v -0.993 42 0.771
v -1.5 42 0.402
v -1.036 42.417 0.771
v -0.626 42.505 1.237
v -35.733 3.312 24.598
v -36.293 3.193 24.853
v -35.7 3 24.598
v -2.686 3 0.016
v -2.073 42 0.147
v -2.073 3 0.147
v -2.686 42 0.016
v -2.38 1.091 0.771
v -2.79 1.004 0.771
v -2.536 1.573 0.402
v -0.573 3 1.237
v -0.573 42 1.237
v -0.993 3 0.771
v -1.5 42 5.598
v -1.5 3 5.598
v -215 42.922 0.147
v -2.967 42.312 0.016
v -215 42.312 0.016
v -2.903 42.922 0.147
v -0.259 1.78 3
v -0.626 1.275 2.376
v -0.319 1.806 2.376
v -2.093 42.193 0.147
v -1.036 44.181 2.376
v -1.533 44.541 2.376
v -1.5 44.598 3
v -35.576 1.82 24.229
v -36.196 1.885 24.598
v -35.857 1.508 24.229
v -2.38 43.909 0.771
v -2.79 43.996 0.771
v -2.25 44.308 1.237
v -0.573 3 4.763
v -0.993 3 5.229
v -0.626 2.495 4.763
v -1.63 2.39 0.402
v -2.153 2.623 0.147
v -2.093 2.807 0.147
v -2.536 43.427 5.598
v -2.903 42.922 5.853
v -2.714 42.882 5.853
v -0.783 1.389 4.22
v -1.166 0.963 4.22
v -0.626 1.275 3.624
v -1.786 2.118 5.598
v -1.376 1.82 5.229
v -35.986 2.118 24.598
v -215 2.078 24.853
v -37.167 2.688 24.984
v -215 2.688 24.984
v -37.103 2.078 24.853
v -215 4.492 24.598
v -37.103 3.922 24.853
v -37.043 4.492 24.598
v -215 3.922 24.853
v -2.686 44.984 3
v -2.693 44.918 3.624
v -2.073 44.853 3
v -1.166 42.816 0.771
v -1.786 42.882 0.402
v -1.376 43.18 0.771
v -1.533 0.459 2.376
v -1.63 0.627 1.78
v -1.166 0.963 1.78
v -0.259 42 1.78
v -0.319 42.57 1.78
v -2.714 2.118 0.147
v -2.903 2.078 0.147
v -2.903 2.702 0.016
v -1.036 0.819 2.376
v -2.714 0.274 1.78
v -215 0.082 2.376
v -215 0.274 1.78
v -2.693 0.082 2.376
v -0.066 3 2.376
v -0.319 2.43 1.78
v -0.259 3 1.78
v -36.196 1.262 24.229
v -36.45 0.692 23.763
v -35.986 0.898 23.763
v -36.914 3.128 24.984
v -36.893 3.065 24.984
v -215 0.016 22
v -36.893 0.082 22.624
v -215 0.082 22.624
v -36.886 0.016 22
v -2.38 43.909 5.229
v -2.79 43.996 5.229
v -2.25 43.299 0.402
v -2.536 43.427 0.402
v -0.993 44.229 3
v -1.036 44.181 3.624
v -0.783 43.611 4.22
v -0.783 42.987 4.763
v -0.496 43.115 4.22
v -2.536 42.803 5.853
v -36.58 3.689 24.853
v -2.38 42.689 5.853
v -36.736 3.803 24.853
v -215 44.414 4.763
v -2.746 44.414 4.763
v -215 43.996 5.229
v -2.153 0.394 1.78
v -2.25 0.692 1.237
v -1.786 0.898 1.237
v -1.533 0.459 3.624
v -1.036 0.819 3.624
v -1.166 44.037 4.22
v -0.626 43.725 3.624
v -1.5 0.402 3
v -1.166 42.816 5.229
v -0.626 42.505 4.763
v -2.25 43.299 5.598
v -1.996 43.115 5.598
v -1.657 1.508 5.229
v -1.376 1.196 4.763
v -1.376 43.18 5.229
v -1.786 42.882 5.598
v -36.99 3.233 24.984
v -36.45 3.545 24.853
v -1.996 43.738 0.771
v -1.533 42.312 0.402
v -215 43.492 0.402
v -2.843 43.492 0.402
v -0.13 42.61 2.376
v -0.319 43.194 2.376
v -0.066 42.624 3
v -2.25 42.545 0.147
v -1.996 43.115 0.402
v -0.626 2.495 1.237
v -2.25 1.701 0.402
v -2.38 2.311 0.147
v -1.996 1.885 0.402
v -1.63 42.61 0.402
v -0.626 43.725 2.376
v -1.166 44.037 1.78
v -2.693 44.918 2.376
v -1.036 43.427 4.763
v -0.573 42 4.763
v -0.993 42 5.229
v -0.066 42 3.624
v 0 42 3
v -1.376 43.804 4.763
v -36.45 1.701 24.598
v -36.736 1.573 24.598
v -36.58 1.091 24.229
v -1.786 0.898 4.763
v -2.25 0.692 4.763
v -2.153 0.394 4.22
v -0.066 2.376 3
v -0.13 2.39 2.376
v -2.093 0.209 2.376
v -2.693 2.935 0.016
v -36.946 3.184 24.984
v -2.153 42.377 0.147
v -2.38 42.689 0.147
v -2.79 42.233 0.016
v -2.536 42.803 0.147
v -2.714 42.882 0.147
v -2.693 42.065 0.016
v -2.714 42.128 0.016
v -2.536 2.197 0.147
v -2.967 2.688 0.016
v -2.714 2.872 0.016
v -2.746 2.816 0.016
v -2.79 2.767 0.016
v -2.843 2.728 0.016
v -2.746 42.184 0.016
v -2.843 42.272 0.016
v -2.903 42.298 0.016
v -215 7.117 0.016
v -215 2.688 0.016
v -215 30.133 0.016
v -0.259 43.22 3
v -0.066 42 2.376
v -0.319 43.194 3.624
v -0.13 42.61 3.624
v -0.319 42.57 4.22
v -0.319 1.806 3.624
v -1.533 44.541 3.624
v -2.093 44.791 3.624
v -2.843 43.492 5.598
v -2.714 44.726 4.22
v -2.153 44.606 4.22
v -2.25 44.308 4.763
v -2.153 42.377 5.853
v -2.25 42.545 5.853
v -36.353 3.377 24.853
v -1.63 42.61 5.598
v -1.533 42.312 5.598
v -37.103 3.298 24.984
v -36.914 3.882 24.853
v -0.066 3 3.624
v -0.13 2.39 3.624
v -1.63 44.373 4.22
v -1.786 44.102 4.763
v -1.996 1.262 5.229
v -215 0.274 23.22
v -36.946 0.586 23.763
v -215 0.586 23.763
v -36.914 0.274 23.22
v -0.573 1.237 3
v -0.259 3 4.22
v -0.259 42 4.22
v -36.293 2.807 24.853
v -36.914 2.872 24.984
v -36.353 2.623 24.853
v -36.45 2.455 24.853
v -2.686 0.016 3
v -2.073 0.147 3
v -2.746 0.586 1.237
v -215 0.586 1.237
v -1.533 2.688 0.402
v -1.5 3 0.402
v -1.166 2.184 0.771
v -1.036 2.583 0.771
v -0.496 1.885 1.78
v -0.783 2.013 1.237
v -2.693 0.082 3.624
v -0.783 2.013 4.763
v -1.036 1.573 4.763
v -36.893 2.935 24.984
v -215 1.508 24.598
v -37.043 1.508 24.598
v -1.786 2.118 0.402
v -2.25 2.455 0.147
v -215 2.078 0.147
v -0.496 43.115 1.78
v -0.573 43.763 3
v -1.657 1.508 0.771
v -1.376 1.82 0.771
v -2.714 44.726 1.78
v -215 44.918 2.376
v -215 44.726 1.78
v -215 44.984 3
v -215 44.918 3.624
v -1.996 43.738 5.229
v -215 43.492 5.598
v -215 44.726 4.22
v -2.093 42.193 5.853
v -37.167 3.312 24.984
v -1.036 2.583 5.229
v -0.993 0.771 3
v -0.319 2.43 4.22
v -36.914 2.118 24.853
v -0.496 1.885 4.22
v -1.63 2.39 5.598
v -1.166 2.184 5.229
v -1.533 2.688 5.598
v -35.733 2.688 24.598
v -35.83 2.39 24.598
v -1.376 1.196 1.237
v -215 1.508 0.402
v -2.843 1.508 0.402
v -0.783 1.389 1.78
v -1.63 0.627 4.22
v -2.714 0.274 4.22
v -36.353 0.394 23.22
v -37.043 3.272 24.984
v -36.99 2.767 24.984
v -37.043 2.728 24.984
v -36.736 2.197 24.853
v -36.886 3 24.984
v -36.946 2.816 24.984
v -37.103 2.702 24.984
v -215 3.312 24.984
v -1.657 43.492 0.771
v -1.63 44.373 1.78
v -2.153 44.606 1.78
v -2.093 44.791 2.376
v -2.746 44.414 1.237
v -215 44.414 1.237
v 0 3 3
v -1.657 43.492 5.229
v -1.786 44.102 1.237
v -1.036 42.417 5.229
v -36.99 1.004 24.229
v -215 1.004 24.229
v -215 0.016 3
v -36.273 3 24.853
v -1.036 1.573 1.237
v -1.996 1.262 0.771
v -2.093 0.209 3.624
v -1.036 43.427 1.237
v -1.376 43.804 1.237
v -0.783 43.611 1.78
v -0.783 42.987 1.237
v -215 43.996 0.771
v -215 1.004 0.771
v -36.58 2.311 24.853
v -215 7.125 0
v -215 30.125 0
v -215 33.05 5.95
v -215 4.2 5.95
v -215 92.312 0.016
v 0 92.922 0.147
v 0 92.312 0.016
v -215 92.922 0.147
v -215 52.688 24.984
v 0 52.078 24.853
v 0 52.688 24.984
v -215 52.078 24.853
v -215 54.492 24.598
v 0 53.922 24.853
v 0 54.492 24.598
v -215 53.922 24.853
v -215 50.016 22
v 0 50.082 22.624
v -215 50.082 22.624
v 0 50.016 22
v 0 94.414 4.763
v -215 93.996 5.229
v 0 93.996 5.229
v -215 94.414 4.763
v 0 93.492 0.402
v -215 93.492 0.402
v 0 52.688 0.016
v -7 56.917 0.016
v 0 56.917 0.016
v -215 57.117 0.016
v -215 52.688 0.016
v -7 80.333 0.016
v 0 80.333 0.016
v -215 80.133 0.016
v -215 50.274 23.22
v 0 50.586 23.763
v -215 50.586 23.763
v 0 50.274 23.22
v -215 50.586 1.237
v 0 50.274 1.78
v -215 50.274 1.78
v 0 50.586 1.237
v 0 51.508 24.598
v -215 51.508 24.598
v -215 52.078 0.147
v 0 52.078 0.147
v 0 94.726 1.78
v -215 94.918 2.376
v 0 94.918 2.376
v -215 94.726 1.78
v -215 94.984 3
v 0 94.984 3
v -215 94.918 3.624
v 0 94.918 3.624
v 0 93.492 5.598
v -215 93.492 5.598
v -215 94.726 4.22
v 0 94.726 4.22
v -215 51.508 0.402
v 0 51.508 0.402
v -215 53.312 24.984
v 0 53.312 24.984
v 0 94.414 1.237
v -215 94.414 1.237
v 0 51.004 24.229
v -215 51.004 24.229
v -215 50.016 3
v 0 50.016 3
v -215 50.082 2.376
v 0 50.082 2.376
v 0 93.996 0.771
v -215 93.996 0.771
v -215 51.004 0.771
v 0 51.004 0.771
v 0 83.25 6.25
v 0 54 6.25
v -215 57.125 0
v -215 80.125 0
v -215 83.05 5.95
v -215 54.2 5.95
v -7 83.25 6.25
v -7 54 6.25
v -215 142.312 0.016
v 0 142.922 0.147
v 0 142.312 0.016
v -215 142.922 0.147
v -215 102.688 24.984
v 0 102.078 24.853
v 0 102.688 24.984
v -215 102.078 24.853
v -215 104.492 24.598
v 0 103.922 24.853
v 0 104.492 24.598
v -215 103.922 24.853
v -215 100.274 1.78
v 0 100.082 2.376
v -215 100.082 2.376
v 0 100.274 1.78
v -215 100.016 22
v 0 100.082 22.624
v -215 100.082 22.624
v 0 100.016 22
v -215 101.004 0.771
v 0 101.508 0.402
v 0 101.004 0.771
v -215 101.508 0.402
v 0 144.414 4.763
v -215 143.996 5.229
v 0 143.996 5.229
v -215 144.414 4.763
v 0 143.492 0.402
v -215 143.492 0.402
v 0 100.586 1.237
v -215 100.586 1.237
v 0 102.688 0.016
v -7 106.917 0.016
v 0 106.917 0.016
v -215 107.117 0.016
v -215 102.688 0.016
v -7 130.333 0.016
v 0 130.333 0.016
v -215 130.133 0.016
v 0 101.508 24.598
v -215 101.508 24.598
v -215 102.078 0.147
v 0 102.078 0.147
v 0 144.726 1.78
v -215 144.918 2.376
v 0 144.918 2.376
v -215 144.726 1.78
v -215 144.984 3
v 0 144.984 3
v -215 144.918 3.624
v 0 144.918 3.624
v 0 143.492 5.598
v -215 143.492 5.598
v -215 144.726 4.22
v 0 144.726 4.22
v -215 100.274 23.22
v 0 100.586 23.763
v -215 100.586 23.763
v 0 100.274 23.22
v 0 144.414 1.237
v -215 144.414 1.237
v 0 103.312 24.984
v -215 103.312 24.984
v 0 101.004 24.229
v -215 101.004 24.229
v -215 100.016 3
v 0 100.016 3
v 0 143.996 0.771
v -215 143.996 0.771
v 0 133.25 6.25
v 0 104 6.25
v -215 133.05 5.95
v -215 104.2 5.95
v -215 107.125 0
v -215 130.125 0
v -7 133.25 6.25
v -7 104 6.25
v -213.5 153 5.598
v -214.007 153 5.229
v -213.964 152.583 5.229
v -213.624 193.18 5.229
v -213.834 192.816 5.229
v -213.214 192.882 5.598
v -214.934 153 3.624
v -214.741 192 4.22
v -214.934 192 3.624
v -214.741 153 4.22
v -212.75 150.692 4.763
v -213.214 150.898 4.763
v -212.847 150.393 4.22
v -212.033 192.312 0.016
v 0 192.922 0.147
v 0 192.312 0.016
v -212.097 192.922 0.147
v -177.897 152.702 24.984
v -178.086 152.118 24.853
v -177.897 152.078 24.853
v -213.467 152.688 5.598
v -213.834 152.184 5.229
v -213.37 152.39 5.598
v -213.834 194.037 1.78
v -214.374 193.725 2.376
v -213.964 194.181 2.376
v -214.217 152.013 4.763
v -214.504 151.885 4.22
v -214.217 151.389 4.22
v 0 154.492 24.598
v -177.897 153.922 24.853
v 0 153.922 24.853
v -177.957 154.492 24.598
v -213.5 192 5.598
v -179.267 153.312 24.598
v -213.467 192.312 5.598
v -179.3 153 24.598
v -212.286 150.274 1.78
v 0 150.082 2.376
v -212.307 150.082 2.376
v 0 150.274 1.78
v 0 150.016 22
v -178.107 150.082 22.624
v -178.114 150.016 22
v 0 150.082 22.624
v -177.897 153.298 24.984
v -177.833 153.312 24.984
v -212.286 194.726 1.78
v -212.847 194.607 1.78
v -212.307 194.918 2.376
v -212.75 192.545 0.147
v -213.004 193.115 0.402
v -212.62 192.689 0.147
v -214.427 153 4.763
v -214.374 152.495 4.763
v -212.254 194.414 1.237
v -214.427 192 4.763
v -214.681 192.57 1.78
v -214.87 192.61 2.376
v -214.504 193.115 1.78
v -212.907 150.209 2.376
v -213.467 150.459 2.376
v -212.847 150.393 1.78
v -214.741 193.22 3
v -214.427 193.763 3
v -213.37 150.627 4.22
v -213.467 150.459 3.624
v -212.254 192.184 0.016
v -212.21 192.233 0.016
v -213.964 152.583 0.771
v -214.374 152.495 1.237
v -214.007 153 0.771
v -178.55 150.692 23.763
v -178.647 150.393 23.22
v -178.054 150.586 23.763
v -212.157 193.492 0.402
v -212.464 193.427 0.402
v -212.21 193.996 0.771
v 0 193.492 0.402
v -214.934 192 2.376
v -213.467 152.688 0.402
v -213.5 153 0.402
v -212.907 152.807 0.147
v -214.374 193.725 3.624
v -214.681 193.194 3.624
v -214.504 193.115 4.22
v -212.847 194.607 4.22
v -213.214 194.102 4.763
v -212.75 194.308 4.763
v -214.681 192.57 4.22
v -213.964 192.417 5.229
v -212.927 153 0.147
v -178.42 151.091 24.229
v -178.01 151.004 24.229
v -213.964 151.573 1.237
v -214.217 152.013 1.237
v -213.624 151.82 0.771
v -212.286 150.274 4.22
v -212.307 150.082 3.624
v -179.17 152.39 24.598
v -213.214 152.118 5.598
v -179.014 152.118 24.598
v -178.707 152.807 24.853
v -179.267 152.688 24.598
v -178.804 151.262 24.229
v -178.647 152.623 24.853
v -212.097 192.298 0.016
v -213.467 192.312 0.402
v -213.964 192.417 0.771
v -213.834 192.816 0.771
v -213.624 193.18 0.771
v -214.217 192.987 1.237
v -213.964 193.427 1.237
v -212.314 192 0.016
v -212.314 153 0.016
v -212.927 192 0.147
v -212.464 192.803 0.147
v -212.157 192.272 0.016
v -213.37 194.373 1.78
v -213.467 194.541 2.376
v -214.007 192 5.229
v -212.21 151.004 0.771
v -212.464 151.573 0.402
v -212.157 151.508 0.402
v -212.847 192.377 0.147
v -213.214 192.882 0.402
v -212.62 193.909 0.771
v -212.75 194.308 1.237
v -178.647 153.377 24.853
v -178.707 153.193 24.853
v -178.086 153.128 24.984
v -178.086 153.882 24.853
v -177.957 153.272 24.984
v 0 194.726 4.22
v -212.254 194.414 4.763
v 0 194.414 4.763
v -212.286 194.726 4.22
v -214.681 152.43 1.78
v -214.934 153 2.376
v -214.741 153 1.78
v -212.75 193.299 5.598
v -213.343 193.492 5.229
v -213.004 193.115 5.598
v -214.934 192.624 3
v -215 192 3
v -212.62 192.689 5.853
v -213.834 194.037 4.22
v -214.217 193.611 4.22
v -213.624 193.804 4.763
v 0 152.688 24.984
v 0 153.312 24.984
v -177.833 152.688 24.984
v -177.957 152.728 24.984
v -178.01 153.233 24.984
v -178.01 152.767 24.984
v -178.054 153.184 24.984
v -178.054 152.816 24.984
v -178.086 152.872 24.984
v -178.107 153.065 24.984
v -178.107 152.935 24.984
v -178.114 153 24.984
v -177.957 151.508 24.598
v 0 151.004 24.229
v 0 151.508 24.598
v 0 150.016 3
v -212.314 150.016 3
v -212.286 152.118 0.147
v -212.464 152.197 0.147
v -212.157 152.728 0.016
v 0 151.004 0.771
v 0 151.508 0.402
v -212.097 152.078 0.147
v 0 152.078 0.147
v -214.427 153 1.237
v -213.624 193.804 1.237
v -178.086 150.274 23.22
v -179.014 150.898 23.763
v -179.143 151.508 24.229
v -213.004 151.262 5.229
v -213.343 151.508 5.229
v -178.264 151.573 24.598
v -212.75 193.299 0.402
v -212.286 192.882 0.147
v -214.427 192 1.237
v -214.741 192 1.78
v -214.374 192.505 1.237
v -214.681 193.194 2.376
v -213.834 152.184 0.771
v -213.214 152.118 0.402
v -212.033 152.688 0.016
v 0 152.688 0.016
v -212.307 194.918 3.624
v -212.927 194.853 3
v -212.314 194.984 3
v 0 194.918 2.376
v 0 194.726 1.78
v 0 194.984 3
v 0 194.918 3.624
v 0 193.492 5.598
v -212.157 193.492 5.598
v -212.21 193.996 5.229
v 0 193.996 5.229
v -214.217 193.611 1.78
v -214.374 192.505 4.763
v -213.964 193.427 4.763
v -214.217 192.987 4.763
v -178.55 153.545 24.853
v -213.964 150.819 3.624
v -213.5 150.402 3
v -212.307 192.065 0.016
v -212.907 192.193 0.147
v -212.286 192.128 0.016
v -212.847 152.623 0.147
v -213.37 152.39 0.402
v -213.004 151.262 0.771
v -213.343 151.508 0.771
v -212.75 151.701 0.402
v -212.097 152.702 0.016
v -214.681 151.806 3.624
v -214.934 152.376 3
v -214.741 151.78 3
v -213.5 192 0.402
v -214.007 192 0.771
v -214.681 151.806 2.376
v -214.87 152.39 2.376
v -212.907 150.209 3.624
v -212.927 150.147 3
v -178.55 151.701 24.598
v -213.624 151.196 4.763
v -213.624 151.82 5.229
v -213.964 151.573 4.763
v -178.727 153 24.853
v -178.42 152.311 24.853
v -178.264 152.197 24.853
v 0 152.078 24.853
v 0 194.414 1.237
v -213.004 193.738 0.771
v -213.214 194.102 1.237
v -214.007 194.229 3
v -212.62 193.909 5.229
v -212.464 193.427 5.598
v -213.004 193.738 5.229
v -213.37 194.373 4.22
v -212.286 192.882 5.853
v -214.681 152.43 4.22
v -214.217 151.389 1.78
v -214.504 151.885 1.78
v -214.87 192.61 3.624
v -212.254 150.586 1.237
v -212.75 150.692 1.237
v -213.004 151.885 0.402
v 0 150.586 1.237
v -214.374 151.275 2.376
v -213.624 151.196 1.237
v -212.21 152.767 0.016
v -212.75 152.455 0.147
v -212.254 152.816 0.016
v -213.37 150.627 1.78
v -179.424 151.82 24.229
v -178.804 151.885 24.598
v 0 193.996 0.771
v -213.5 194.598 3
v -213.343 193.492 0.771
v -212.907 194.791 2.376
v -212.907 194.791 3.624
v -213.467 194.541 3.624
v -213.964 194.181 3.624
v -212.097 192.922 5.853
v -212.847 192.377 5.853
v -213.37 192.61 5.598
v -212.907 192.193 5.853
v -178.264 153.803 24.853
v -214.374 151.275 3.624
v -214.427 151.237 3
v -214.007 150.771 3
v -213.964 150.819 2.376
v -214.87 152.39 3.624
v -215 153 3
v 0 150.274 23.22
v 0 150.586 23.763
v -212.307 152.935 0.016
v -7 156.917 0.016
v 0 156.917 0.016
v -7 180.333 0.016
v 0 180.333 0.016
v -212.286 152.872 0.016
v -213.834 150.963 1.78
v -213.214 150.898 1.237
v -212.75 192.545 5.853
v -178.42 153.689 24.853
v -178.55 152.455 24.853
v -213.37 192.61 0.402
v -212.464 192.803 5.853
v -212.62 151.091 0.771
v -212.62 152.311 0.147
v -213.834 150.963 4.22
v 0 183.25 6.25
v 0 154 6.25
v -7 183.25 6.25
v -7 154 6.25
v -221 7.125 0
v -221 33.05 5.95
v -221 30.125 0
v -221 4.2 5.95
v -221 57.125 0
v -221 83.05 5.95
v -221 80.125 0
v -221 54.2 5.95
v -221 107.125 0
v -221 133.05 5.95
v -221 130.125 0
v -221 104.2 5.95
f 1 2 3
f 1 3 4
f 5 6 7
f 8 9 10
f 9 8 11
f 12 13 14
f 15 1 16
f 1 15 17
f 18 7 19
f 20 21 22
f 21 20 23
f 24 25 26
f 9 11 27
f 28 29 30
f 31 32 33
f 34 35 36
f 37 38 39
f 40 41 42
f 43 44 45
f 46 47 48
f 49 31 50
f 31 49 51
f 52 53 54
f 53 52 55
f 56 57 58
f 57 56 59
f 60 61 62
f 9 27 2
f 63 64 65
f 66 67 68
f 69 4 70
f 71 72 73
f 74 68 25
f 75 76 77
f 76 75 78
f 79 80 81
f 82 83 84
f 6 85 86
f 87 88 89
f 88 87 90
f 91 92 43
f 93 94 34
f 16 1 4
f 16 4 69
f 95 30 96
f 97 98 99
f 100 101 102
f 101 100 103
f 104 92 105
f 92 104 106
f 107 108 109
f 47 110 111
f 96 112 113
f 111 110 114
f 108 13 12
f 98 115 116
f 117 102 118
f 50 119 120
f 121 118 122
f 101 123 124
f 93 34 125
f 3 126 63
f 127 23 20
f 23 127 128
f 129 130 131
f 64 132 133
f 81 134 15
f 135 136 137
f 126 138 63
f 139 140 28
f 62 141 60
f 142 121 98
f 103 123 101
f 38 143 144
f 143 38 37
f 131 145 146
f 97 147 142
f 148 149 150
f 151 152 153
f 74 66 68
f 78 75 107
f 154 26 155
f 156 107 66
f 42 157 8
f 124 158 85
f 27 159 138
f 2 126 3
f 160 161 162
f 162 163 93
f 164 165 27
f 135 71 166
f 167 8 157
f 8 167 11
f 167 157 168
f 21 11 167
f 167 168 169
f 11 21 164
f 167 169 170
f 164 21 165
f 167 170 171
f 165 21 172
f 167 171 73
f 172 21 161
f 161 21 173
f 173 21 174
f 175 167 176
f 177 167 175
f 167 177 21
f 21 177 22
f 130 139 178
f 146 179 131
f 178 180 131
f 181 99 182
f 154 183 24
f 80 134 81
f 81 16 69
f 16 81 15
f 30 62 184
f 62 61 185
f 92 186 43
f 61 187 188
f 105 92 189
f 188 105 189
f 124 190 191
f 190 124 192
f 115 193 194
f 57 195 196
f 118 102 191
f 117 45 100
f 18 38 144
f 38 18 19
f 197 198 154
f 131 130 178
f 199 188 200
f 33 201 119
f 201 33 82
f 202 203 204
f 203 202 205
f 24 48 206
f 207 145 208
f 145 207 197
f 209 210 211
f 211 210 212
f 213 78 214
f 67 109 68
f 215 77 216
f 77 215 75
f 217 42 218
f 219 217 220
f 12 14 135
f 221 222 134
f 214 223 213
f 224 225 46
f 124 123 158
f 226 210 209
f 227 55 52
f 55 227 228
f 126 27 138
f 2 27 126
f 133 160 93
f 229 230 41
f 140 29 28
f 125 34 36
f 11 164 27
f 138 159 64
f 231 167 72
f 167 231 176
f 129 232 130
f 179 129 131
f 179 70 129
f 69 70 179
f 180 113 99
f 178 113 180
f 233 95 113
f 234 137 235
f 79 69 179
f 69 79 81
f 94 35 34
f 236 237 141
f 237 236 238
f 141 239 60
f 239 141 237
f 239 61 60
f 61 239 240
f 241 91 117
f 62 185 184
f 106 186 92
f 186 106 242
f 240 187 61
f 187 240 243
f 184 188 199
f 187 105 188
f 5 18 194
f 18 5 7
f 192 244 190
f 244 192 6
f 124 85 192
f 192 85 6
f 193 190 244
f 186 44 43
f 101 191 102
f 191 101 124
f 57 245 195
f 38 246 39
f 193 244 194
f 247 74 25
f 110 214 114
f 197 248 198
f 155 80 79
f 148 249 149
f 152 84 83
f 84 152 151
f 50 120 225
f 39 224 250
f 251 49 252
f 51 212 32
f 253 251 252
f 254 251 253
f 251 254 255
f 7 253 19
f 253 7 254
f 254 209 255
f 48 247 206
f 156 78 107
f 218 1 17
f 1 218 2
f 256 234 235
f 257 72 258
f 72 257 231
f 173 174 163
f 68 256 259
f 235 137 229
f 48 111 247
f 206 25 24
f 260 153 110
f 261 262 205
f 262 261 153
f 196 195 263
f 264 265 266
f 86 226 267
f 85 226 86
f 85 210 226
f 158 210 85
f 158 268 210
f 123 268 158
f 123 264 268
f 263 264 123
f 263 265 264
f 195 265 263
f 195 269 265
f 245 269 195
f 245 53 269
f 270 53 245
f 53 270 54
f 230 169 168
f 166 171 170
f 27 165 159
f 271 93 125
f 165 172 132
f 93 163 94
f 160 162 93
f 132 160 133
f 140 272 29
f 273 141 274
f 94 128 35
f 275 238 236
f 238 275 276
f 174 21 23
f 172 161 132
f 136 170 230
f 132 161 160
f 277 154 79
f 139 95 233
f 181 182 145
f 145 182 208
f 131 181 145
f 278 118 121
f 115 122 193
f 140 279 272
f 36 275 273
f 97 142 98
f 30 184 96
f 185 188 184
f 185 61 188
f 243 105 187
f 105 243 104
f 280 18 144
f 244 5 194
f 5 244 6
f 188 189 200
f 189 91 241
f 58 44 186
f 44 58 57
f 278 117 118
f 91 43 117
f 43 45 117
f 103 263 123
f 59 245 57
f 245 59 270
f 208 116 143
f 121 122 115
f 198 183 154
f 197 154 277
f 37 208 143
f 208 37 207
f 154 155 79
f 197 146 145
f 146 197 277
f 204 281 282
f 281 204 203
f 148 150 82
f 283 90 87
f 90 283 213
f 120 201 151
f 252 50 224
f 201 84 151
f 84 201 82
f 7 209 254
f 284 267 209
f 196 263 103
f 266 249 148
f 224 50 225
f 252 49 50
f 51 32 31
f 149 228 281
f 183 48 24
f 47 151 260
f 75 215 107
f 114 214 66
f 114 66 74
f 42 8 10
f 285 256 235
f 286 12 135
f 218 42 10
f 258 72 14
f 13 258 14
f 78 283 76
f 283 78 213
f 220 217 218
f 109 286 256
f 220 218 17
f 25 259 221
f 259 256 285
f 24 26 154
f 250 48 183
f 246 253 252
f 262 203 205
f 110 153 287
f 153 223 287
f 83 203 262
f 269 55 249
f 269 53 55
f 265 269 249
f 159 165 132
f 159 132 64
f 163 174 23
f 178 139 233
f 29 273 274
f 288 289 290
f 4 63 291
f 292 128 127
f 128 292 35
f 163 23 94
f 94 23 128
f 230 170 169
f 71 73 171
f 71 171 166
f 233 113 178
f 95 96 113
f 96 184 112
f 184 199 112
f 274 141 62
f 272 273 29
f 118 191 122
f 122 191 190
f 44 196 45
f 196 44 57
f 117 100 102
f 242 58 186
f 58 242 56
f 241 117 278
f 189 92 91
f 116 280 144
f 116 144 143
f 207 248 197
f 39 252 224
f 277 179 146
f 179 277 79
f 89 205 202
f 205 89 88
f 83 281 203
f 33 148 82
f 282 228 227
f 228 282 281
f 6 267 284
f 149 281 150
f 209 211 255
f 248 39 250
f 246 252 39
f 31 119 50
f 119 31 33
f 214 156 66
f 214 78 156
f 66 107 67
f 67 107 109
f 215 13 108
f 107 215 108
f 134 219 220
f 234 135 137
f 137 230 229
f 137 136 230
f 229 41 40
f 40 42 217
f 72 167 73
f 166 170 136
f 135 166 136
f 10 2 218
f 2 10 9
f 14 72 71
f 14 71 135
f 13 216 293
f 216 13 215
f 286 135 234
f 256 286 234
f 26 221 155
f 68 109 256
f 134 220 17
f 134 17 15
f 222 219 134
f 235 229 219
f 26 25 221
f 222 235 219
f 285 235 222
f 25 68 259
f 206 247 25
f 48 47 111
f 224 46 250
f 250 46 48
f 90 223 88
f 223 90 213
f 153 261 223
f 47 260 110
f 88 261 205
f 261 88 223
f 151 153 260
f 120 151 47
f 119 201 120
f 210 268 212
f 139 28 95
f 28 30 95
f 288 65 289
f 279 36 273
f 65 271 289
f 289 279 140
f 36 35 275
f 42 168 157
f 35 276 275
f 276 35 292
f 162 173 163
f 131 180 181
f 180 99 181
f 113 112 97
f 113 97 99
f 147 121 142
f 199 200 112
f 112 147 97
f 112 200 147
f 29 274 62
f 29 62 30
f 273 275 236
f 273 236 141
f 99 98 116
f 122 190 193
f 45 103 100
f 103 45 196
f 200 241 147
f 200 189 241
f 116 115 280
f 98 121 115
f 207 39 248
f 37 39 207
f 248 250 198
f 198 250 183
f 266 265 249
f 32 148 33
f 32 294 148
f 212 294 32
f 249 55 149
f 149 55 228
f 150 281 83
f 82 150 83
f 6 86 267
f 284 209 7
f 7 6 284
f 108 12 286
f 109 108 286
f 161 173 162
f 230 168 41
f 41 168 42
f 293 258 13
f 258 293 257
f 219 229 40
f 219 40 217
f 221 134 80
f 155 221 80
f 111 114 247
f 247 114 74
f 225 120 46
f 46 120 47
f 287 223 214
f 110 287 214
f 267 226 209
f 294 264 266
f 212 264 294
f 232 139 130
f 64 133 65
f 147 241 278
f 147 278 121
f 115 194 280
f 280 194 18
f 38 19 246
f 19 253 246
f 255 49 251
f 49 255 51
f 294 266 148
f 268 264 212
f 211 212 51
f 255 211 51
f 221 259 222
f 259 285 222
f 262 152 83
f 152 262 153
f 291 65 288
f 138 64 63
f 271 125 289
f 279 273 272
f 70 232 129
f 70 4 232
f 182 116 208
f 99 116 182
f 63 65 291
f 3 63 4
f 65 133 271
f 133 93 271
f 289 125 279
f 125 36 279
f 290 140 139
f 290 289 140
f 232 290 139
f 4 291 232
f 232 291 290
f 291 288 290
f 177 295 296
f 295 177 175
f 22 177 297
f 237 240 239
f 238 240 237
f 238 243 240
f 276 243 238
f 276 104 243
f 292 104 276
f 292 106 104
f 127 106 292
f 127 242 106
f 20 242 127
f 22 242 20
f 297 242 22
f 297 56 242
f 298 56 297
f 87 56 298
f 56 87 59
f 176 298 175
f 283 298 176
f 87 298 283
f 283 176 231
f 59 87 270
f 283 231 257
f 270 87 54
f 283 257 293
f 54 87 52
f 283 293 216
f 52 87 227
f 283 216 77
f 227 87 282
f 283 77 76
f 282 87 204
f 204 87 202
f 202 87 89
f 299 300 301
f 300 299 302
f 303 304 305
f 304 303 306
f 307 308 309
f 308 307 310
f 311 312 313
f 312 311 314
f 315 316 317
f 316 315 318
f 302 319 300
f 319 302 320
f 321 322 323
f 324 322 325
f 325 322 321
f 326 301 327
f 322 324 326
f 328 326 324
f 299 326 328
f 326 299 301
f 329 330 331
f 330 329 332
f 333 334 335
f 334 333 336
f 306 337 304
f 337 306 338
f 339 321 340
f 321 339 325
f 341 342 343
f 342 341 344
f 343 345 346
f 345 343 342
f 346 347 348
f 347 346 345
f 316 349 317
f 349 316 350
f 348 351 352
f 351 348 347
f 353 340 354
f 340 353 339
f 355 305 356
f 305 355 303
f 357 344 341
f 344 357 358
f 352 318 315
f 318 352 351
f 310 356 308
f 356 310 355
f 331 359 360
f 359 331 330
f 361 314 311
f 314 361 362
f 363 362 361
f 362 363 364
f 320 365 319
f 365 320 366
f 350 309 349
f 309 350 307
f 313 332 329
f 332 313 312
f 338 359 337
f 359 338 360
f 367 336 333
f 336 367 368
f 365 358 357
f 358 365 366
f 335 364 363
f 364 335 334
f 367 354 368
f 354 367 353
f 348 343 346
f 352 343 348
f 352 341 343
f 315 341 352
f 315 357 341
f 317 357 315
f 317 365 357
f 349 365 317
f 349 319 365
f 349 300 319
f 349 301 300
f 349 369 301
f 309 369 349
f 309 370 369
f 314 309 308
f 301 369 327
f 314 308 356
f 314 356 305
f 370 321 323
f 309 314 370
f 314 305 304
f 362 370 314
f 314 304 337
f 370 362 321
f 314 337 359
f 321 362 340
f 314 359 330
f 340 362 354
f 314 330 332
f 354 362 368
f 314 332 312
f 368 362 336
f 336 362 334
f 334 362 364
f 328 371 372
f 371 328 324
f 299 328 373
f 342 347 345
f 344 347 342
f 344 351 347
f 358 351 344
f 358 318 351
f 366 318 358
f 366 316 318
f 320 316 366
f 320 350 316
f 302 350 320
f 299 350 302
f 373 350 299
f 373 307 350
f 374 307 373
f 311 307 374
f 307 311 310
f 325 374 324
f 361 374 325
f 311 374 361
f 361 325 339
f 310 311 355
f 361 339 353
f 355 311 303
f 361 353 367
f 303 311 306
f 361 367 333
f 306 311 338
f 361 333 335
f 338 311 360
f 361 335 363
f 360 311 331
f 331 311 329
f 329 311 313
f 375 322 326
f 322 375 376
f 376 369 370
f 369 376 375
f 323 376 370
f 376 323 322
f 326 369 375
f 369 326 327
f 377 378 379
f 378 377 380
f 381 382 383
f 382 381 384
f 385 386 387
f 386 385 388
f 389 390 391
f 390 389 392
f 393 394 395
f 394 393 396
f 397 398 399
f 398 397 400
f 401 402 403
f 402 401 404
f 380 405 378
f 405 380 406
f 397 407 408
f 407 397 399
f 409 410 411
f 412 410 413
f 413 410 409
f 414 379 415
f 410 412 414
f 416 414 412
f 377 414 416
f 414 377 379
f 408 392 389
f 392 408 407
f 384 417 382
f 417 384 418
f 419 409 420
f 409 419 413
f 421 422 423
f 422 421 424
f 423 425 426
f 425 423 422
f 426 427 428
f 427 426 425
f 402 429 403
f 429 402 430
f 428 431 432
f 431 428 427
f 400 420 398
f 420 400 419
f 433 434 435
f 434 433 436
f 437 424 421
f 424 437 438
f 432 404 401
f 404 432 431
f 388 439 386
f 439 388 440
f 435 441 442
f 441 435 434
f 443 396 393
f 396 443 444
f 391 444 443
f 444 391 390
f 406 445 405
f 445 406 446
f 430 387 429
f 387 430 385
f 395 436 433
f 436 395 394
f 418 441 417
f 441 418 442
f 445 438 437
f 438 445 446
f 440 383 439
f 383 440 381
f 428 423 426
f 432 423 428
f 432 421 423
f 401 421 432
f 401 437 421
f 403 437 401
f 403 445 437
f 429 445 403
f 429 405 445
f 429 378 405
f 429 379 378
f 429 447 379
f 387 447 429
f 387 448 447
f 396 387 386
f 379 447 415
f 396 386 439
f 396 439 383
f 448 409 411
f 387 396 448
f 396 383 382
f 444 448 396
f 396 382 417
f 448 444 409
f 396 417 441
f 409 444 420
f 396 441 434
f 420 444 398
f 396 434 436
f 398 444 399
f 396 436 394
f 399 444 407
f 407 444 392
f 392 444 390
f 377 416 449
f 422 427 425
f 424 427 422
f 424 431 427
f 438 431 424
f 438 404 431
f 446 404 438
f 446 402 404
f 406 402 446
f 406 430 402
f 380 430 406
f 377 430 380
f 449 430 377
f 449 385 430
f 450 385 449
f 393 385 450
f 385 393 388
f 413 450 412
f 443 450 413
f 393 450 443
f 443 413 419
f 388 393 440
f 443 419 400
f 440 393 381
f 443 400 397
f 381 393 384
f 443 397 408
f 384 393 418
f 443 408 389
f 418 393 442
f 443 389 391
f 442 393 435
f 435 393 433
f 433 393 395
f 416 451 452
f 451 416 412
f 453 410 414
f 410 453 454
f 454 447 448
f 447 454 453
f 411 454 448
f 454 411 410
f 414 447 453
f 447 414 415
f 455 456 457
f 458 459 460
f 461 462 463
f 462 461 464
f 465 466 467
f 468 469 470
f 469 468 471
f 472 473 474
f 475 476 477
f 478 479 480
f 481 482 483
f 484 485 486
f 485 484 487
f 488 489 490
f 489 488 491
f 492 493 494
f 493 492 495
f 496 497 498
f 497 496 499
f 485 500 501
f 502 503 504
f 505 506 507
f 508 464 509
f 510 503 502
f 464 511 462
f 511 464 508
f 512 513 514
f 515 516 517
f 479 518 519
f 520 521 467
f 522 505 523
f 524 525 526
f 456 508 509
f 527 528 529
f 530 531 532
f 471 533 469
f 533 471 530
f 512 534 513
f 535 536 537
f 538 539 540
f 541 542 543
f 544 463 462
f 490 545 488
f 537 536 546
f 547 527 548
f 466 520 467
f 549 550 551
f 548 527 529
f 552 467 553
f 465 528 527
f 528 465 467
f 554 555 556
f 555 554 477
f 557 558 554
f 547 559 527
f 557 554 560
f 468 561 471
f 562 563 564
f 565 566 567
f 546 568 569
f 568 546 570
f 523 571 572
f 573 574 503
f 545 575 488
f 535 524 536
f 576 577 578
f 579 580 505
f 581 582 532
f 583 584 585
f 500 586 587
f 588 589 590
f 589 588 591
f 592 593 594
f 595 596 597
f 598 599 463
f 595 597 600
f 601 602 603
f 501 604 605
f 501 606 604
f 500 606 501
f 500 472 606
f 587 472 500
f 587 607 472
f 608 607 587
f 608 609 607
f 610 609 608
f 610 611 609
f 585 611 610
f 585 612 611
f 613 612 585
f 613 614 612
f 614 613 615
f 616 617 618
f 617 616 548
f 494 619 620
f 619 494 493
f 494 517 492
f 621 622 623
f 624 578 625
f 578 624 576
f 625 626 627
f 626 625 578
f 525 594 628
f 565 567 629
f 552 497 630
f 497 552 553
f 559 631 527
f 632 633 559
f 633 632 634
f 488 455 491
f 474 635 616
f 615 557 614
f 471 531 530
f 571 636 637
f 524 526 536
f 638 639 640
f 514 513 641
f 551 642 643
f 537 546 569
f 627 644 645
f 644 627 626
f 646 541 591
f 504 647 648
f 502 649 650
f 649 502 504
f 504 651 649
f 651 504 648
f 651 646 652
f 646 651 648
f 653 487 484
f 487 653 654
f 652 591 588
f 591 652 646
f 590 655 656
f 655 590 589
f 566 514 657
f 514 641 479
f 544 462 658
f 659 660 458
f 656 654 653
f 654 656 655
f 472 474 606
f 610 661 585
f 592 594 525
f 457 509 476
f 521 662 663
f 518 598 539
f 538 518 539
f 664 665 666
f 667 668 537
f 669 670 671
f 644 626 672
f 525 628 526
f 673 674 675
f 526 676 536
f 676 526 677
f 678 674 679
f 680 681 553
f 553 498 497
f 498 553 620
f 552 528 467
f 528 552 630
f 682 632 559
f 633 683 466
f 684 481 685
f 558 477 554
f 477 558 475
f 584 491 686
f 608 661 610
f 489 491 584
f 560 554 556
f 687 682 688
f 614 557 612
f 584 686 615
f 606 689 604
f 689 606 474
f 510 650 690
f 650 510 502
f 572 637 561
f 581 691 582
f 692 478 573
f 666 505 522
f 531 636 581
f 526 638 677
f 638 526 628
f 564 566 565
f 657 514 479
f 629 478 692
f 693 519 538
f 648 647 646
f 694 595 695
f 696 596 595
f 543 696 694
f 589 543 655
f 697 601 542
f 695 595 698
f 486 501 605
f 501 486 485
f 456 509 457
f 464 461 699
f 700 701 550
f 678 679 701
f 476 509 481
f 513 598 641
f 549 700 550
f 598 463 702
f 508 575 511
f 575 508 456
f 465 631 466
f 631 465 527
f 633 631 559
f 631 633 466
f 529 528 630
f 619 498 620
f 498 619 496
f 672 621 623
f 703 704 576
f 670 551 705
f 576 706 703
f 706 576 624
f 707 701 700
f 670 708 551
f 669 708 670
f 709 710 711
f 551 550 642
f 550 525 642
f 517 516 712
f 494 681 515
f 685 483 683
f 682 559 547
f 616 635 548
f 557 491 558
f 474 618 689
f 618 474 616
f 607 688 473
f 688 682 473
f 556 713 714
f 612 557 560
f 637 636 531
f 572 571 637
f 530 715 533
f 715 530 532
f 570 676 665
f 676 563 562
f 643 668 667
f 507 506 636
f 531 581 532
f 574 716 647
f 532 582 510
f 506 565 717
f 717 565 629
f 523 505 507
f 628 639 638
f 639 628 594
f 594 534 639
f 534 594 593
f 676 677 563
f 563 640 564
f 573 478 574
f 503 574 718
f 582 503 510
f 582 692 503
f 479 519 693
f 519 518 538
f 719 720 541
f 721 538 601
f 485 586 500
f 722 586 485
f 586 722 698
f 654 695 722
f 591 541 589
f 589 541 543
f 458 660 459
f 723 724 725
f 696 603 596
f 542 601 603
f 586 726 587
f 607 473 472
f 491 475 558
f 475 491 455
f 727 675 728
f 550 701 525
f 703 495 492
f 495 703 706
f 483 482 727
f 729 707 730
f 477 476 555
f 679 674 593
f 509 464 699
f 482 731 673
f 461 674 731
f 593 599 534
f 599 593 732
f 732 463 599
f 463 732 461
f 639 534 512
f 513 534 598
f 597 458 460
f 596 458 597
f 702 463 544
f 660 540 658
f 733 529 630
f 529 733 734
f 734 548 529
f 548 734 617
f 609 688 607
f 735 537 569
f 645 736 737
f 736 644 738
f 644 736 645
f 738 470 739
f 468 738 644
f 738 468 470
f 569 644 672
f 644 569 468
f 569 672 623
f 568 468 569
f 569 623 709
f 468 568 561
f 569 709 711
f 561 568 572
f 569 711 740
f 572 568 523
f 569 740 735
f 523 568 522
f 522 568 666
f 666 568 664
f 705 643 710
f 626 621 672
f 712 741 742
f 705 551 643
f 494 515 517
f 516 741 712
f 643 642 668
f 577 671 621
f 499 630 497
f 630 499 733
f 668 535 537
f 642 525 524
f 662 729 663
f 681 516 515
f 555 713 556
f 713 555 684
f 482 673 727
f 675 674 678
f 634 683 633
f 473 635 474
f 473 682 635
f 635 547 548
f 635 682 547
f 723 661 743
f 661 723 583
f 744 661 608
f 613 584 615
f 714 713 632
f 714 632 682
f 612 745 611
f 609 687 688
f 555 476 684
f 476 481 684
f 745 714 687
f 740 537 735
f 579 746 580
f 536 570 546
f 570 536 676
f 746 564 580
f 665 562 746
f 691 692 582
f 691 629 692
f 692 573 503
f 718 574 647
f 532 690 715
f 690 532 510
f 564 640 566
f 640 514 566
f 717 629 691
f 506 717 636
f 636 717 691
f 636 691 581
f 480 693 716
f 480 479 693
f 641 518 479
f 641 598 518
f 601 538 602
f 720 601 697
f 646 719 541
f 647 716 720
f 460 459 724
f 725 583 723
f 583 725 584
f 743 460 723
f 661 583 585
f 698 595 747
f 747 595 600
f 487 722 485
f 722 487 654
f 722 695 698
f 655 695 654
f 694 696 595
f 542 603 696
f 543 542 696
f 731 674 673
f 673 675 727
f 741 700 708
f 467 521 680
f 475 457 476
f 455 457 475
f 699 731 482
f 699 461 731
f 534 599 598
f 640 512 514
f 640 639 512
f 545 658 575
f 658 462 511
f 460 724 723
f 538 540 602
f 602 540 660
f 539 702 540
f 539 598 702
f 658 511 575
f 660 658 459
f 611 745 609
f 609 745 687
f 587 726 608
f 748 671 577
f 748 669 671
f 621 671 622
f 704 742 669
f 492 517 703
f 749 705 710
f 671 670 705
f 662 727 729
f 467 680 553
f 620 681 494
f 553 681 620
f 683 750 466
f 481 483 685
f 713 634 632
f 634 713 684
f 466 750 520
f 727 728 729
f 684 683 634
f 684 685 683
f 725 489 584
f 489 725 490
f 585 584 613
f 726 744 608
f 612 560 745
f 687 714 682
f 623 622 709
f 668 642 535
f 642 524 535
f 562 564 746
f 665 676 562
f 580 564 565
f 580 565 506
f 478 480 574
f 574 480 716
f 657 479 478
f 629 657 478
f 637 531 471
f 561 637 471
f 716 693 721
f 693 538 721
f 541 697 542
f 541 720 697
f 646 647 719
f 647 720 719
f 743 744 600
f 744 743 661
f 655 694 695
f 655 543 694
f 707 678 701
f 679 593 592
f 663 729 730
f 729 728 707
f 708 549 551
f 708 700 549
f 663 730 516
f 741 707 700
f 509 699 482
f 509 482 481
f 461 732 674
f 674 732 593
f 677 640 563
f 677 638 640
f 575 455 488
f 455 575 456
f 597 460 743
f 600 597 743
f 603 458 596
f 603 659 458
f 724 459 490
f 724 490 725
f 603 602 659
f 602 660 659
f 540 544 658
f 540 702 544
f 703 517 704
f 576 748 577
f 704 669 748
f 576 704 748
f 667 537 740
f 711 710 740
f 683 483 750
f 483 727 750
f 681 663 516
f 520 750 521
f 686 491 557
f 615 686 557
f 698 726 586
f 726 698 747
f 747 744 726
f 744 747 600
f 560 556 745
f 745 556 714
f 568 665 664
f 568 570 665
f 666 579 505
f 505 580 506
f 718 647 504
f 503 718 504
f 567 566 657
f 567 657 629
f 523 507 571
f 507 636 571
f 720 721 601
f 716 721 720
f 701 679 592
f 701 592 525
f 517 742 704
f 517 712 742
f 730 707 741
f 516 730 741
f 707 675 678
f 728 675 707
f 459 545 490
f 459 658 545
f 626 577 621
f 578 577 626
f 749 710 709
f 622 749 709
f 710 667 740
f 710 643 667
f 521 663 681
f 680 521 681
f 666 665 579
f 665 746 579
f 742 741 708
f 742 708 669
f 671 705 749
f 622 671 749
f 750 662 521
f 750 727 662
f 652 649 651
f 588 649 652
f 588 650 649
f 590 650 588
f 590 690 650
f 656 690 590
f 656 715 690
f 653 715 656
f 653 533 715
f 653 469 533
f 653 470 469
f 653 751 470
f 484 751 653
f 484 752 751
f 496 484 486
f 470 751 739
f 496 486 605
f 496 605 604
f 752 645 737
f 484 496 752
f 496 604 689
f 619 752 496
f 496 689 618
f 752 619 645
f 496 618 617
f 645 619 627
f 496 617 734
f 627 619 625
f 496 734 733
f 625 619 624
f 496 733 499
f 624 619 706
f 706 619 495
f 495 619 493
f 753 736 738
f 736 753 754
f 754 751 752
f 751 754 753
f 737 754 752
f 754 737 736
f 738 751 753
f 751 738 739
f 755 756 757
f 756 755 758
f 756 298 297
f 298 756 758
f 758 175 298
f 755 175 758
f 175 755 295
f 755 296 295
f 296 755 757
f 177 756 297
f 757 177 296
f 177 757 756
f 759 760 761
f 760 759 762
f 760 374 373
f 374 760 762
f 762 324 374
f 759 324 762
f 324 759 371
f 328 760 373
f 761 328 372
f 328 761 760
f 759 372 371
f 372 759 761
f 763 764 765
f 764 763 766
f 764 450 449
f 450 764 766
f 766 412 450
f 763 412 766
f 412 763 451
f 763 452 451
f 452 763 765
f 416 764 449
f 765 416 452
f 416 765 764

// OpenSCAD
// ramp size
L = 860;
W = 45;
H = 25;

// printer bed size
MAX_X = 250;
MAX_Y = 200;

// radius of curvature
R = 3;

// distance between details
distance = 5;

module base() {   
    w = W - R*2;
    h = H - R*2;
    minkowski() {
        translate([-R, R, R])
        difference() {
            // ramp body
            rotate([0, -90, 0])
                linear_extrude(L-R*2)
                polygon([[0, 0], [0, w], [h, 0]]);

            // cut left
            translate([-W, 0, 0])
                rotate([0, -90, -90])
                linear_extrude(W)
                polygon([[0, W], [H, W], [H, 0]]);
            
            // cut right
            translate([-L + W + R*2, W, 0])
                rotate([0, -90, 90])
                linear_extrude(W)
                polygon([[0, W], [H, W], [H, 0]]);
        }
        
        sphere(R, $fn=30);
    }
}

lock_h = H / 4;
lock_wh = (W - 6) * (H - lock_h) / H / 2;
lock_wl = lock_wh * 0.8;
dh = 0.3;
dw = 0.2;

module lock_hole() {
    rotate([0, -90, 0])
        linear_extrude(8)
        polygon([
            [0, -lock_wl], [lock_h, -lock_wh], 
            [lock_h, lock_wh], [0, lock_wl]
        ]);
}

module lock_pin() {
    rotate([0, -90, 0])
        linear_extrude(6)
        polygon([
            [0, -lock_wl+dw], [lock_h-dh, -lock_wh+dw], 
            [lock_h-dh, lock_wh-dw], [0, lock_wl-dw]
        ]);
}

module ramp() {
    n_parts = ceil(L / (MAX_X - 10));
    part_lenght = L / n_parts;

    for (i = [0 : n_parts - 1]){
        difference() {
            translate([0, i * (W + distance), 0]) {
                intersection() {
                    translate([i * part_lenght, 0, 0])
                        base();
                    
                    translate([-part_lenght, 0, 0])
                        cube([part_lenght, W, H]);
                }
            }
            
            if (i > 0) {
                translate([1, i * (W + distance) + lock_wh + 4, 0])
                    lock_hole();
            }
        }
        
        if (i < n_parts - 1) {
            translate([-part_lenght, i * (W + distance) + lock_wh + 4, 0])
                lock_pin();
        }
    }
}

module test_lock() {
    intersection() {
        ramp();
        translate([-10, 50, 0]) cube([30, 40, 10]);
       
    }

    intersection() {
        translate([230, 0, 0])
            ramp();
        translate([0, 50, 0]) cube([25, 40, 10]);
    }
}

ramp();
// test_lock();
